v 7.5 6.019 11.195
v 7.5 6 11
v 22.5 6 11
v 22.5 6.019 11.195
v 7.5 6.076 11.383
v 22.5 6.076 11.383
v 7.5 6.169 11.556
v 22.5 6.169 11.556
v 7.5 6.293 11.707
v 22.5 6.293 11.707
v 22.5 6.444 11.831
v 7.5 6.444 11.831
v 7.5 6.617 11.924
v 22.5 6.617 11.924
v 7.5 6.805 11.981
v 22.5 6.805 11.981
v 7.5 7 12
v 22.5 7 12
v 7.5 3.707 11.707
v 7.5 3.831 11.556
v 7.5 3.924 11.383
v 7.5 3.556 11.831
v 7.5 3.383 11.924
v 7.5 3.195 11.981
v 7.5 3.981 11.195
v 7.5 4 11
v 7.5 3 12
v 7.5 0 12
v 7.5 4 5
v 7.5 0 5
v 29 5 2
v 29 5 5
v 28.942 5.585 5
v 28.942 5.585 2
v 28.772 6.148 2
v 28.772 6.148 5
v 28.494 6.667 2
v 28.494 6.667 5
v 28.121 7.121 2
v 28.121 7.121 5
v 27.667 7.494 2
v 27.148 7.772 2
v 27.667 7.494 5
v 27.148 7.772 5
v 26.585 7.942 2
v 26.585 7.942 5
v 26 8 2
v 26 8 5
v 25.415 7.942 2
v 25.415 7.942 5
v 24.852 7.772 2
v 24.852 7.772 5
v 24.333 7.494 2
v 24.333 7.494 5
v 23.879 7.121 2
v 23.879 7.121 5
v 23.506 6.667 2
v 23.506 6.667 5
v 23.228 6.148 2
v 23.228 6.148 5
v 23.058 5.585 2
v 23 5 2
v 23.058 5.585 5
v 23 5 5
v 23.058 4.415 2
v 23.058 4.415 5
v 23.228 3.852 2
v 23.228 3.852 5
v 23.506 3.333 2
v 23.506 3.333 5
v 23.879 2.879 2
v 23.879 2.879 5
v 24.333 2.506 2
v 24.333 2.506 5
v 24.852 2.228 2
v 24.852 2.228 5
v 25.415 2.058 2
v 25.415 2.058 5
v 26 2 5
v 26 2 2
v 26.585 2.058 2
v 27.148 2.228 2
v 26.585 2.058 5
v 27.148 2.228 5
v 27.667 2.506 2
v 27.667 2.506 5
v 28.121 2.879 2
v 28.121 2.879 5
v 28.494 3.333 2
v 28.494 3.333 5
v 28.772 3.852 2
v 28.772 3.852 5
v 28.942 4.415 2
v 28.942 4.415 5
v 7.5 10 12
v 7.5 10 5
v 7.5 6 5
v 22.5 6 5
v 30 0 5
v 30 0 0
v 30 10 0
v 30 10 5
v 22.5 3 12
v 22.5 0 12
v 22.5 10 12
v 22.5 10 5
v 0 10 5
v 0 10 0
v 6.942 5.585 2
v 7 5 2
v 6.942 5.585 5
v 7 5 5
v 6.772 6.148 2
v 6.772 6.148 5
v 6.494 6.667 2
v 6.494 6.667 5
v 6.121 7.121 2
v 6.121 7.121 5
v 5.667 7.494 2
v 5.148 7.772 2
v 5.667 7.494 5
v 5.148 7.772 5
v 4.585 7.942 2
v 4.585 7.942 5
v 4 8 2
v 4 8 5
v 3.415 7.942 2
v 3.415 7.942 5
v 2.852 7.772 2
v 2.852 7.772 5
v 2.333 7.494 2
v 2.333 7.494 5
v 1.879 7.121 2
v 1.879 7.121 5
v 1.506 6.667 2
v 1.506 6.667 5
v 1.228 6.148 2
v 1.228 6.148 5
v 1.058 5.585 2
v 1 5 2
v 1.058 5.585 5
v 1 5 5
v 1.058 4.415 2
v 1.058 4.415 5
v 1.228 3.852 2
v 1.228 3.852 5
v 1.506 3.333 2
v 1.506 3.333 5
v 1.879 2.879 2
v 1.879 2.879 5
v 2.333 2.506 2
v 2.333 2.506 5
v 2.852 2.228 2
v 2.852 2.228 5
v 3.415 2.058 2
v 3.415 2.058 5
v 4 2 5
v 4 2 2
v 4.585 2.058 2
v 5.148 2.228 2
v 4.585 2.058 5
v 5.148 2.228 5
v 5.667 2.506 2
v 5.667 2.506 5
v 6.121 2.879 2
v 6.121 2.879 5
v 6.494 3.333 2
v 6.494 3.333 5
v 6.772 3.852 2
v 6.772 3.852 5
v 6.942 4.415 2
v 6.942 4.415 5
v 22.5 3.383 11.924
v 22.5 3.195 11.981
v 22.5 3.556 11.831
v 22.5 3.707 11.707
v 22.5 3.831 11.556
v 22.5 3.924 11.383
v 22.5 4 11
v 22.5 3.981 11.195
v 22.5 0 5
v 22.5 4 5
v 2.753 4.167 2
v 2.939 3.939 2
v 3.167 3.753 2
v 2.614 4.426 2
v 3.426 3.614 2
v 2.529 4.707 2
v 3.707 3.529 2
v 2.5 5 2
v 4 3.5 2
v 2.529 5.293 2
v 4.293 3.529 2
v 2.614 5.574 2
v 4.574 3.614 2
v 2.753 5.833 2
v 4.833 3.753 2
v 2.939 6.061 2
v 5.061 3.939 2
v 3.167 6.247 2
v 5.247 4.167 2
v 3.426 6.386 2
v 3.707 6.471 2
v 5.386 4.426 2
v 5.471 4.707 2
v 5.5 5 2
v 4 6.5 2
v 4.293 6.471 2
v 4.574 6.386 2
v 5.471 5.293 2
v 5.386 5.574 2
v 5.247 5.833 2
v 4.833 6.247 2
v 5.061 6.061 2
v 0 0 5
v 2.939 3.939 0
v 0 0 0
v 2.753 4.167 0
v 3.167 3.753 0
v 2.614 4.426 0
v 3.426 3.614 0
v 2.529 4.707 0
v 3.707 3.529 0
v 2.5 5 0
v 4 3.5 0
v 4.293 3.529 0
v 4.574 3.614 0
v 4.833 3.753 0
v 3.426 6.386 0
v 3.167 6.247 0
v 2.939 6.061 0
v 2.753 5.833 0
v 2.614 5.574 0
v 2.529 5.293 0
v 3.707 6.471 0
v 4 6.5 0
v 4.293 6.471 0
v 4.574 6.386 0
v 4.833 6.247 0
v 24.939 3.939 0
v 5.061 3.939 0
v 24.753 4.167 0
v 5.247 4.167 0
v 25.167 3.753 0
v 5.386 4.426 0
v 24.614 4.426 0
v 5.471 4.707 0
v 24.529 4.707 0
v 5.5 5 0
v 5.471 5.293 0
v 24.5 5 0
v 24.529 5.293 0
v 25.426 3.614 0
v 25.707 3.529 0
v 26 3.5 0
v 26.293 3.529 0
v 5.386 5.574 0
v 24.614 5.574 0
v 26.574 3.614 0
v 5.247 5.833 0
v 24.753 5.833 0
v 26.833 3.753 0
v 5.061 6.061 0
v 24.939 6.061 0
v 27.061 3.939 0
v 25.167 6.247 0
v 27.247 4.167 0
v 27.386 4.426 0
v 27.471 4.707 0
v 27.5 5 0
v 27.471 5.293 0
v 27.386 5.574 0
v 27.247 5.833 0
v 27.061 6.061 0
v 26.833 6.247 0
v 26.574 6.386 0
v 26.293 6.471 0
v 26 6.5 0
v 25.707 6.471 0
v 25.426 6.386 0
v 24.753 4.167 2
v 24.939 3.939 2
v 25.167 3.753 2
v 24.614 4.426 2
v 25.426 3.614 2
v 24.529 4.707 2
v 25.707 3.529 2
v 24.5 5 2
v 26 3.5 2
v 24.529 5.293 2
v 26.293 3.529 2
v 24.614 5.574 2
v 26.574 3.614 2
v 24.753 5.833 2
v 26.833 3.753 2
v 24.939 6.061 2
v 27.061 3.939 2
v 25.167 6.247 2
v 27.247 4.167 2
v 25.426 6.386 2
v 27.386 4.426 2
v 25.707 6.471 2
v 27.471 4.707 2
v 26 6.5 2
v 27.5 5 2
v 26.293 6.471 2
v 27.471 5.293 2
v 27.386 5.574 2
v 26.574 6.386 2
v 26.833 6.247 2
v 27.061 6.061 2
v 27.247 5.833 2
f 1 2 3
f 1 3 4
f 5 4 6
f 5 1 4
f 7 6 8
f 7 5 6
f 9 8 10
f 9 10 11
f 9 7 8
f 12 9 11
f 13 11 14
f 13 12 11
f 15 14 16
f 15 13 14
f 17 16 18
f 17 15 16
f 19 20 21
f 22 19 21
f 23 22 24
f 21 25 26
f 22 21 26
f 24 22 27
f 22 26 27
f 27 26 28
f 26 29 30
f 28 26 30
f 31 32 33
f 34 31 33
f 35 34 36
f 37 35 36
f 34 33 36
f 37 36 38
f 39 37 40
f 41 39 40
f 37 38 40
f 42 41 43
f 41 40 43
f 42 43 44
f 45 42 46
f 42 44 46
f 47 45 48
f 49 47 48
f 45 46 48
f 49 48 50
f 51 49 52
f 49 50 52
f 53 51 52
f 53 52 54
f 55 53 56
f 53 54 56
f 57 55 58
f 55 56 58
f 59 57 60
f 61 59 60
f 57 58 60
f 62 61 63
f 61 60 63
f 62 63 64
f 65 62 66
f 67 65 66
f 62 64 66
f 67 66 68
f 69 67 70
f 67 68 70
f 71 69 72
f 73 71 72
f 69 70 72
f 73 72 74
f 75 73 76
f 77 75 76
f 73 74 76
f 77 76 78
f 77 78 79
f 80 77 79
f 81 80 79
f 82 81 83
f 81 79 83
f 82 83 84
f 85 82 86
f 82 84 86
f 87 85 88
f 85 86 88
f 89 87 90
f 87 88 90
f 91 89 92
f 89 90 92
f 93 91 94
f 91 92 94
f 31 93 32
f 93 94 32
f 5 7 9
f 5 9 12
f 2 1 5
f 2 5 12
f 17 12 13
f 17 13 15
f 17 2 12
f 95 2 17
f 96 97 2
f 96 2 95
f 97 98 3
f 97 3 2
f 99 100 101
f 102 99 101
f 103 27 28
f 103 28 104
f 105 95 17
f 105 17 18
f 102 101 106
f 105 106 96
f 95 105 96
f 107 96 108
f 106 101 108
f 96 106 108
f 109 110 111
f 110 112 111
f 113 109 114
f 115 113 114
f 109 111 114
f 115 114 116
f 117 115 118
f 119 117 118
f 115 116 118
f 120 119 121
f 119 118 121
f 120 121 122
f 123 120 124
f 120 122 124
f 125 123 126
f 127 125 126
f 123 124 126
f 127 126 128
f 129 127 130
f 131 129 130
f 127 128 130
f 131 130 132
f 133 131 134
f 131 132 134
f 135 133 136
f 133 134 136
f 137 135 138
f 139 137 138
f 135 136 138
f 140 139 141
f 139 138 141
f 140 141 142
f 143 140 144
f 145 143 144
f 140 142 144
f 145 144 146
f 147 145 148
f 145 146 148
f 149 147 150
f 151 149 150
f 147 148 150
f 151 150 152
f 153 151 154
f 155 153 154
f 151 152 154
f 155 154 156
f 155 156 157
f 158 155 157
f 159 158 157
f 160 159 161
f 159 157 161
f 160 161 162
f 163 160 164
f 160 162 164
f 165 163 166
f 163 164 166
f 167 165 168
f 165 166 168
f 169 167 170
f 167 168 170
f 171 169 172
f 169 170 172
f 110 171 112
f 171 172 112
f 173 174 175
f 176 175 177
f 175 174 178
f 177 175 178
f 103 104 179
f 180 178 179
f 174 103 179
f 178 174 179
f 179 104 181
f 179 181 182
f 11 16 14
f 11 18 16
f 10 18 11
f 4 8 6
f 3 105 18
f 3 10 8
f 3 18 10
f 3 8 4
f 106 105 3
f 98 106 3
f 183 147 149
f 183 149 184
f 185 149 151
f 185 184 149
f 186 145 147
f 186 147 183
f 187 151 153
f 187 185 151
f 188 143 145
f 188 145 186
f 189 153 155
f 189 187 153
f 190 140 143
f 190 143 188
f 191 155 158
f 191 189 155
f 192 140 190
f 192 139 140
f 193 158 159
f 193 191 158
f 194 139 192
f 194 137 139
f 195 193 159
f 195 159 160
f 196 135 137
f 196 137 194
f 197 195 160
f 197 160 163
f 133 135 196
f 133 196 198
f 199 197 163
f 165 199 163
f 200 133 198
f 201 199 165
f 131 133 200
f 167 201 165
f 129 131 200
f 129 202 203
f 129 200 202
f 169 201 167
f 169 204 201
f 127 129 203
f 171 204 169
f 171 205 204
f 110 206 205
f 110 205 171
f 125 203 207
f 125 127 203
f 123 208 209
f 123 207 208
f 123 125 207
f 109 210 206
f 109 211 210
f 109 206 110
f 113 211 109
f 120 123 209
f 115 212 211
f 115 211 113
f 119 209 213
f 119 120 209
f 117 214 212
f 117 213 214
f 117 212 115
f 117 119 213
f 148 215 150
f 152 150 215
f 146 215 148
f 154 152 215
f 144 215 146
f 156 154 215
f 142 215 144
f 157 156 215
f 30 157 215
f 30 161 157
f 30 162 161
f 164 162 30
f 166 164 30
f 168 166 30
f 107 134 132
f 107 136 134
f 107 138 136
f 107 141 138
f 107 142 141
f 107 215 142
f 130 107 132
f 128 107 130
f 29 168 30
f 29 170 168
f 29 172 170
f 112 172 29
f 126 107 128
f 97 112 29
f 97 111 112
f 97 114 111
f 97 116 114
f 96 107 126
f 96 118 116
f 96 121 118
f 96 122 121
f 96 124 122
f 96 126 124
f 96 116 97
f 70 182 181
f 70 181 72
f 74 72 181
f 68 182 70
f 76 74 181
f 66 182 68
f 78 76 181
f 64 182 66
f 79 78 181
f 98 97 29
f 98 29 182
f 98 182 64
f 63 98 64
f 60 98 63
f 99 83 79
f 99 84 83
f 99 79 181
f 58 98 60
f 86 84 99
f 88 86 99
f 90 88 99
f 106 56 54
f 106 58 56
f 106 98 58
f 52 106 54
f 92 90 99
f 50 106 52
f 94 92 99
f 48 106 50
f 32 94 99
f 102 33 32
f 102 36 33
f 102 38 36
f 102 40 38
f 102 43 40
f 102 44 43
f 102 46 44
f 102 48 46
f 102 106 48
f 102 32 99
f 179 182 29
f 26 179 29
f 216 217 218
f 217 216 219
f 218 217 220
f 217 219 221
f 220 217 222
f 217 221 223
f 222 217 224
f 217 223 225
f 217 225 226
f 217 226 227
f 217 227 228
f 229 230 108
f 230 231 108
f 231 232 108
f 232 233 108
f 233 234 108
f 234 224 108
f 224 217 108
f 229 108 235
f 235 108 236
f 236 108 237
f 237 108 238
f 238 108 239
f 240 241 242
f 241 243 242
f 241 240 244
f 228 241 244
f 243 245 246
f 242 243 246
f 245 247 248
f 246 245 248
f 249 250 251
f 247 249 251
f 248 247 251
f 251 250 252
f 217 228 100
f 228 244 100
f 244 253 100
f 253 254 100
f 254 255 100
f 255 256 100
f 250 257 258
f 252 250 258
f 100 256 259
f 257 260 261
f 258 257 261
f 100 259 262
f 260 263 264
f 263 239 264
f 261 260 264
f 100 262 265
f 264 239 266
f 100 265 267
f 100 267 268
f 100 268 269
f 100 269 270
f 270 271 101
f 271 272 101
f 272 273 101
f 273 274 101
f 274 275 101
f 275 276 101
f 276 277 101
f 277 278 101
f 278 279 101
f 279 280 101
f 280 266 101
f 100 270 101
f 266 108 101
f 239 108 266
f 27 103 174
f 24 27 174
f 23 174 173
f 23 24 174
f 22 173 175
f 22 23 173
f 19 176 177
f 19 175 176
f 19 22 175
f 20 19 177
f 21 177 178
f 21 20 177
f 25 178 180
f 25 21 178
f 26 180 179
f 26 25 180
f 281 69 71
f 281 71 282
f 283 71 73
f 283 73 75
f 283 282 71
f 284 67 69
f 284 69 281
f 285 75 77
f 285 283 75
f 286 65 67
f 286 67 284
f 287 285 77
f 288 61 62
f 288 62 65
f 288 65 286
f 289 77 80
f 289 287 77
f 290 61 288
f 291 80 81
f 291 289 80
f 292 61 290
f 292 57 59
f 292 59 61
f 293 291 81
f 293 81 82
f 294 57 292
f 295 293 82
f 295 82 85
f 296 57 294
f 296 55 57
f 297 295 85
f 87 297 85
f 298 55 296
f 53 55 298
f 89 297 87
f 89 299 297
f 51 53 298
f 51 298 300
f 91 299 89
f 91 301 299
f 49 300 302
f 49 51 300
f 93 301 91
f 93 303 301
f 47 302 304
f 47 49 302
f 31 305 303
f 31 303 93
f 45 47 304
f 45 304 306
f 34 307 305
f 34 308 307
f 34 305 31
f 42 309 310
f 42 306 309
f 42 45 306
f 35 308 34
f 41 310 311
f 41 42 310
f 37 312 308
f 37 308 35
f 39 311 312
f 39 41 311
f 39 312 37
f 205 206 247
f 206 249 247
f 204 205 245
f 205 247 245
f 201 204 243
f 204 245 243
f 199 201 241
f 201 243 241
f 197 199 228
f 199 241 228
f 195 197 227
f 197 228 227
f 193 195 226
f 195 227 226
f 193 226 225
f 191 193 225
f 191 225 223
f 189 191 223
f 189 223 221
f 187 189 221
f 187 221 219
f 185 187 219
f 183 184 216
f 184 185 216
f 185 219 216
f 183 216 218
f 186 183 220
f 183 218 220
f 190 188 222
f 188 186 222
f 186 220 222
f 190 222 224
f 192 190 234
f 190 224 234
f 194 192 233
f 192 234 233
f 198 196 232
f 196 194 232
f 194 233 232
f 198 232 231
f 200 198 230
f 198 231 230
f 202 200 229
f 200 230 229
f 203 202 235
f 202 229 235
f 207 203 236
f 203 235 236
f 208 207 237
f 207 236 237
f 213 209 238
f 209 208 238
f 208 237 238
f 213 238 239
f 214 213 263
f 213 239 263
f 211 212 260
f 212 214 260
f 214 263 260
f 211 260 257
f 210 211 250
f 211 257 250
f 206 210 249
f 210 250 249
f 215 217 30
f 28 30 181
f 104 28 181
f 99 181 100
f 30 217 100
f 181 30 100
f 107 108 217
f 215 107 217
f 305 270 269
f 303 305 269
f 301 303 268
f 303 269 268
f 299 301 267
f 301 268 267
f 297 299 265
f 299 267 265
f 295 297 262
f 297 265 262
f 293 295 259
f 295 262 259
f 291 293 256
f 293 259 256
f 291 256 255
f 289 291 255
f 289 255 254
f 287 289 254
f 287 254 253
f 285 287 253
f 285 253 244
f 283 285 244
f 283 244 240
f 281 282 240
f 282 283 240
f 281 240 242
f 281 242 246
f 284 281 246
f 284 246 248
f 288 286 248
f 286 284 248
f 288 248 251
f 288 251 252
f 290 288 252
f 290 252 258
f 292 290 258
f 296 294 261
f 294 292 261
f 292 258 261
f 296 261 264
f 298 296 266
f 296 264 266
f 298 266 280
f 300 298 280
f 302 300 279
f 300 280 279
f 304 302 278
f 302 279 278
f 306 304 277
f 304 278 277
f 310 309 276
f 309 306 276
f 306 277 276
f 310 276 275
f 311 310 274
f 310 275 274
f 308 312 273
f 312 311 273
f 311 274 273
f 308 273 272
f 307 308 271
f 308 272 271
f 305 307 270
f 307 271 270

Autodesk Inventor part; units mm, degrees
ref_plane "YZ Plane" through (0, 0, 0) normal (1, 0, 0) x (0, 1, 0)
ref_plane "XZ Plane" through (0, 0, 0) normal (0, 1, 0) x (-1, 0, 0)
ref_plane "XY Plane" through (0, 0, 0) normal (0, 0, 1) x (1, 0, 0)
sketch "Sketch1" plane through (0, 0, 0) normal (0, 0, 1) x (1, 0, 0)
  line L0 (0, 0) -> (30, 0)
  line L1 (30, 0) -> (30, 10)
  line L2 (30, 10) -> (0, 10)
  line L3 (0, 10) -> (0, 0)
  circle A0 centre (4, 5) radius 1.5
  circle A1 centre (26, 5) radius 1.5
  point P0 (0, 5)
  dimension "d0" = 30
  dimension "d1" = 10
  dimension "d22" = 3
  dimension "d23" = 3
  dimension "d24" = 4
  dimension "d25" = 4
extrude "Extrusion1" add sketch "Sketch1" along normal blind 5
sketch "Sketch2" plane through (0, 0, 5) normal (0, 0, 1) x (1, 0, 0)
  line L0 (30, 10) -> (0, 10) projected
  line L1 (0, 0) -> (30, 0) projected
  line L2 (7.5, 10) -> (22.5, 10)
  line L3 (22.5, 10) -> (22.5, 6)
  line L4 (22.5, 6) -> (7.5, 6)
  line L5 (7.5, 6) -> (7.5, 10)
  line L6 (7.5, 0) -> (22.5, 0)
  line L7 (22.5, 0) -> (22.5, 4)
  line L8 (22.5, 4) -> (7.5, 4)
  line L9 (7.5, 4) -> (7.5, 0)
  point P0 (15, 10)
  point P1 (15, 10)
  point P2 (15, 0)
  point P3 (15, 0)
  dimension "d14" = 15
  dimension "d15" = 15
  dimension "d31" = 2
  dimension "d32" = 4
  dimension "d33" = 4
extrude "Extrusion2" add sketch "Sketch2" along normal blind 7
fillet "Fillet1" radius 1 2 edges at (15, 6, 12) (15, 4, 12)
sketch "Sketch3" plane through (0, 0, 5) normal (0, 0, 1) x (1, 0, 0)
  circle A0 centre (4, 5) radius 1.5 projected
  circle A1 centre (26, 5) radius 1.5 projected
  circle A2 centre (4, 5) radius 3
  circle A3 centre (26, 5) radius 3
  point P0 (0, 0)
  dimension "d35" = 6
  dimension "d36" = 6
extrude "Extrusion3" cut sketch "Sketch3" against normal blind 3
equation "\"d15\" = d14"
equation "\"d32\" = d33"
properties part number "GT2 grip n roll"
